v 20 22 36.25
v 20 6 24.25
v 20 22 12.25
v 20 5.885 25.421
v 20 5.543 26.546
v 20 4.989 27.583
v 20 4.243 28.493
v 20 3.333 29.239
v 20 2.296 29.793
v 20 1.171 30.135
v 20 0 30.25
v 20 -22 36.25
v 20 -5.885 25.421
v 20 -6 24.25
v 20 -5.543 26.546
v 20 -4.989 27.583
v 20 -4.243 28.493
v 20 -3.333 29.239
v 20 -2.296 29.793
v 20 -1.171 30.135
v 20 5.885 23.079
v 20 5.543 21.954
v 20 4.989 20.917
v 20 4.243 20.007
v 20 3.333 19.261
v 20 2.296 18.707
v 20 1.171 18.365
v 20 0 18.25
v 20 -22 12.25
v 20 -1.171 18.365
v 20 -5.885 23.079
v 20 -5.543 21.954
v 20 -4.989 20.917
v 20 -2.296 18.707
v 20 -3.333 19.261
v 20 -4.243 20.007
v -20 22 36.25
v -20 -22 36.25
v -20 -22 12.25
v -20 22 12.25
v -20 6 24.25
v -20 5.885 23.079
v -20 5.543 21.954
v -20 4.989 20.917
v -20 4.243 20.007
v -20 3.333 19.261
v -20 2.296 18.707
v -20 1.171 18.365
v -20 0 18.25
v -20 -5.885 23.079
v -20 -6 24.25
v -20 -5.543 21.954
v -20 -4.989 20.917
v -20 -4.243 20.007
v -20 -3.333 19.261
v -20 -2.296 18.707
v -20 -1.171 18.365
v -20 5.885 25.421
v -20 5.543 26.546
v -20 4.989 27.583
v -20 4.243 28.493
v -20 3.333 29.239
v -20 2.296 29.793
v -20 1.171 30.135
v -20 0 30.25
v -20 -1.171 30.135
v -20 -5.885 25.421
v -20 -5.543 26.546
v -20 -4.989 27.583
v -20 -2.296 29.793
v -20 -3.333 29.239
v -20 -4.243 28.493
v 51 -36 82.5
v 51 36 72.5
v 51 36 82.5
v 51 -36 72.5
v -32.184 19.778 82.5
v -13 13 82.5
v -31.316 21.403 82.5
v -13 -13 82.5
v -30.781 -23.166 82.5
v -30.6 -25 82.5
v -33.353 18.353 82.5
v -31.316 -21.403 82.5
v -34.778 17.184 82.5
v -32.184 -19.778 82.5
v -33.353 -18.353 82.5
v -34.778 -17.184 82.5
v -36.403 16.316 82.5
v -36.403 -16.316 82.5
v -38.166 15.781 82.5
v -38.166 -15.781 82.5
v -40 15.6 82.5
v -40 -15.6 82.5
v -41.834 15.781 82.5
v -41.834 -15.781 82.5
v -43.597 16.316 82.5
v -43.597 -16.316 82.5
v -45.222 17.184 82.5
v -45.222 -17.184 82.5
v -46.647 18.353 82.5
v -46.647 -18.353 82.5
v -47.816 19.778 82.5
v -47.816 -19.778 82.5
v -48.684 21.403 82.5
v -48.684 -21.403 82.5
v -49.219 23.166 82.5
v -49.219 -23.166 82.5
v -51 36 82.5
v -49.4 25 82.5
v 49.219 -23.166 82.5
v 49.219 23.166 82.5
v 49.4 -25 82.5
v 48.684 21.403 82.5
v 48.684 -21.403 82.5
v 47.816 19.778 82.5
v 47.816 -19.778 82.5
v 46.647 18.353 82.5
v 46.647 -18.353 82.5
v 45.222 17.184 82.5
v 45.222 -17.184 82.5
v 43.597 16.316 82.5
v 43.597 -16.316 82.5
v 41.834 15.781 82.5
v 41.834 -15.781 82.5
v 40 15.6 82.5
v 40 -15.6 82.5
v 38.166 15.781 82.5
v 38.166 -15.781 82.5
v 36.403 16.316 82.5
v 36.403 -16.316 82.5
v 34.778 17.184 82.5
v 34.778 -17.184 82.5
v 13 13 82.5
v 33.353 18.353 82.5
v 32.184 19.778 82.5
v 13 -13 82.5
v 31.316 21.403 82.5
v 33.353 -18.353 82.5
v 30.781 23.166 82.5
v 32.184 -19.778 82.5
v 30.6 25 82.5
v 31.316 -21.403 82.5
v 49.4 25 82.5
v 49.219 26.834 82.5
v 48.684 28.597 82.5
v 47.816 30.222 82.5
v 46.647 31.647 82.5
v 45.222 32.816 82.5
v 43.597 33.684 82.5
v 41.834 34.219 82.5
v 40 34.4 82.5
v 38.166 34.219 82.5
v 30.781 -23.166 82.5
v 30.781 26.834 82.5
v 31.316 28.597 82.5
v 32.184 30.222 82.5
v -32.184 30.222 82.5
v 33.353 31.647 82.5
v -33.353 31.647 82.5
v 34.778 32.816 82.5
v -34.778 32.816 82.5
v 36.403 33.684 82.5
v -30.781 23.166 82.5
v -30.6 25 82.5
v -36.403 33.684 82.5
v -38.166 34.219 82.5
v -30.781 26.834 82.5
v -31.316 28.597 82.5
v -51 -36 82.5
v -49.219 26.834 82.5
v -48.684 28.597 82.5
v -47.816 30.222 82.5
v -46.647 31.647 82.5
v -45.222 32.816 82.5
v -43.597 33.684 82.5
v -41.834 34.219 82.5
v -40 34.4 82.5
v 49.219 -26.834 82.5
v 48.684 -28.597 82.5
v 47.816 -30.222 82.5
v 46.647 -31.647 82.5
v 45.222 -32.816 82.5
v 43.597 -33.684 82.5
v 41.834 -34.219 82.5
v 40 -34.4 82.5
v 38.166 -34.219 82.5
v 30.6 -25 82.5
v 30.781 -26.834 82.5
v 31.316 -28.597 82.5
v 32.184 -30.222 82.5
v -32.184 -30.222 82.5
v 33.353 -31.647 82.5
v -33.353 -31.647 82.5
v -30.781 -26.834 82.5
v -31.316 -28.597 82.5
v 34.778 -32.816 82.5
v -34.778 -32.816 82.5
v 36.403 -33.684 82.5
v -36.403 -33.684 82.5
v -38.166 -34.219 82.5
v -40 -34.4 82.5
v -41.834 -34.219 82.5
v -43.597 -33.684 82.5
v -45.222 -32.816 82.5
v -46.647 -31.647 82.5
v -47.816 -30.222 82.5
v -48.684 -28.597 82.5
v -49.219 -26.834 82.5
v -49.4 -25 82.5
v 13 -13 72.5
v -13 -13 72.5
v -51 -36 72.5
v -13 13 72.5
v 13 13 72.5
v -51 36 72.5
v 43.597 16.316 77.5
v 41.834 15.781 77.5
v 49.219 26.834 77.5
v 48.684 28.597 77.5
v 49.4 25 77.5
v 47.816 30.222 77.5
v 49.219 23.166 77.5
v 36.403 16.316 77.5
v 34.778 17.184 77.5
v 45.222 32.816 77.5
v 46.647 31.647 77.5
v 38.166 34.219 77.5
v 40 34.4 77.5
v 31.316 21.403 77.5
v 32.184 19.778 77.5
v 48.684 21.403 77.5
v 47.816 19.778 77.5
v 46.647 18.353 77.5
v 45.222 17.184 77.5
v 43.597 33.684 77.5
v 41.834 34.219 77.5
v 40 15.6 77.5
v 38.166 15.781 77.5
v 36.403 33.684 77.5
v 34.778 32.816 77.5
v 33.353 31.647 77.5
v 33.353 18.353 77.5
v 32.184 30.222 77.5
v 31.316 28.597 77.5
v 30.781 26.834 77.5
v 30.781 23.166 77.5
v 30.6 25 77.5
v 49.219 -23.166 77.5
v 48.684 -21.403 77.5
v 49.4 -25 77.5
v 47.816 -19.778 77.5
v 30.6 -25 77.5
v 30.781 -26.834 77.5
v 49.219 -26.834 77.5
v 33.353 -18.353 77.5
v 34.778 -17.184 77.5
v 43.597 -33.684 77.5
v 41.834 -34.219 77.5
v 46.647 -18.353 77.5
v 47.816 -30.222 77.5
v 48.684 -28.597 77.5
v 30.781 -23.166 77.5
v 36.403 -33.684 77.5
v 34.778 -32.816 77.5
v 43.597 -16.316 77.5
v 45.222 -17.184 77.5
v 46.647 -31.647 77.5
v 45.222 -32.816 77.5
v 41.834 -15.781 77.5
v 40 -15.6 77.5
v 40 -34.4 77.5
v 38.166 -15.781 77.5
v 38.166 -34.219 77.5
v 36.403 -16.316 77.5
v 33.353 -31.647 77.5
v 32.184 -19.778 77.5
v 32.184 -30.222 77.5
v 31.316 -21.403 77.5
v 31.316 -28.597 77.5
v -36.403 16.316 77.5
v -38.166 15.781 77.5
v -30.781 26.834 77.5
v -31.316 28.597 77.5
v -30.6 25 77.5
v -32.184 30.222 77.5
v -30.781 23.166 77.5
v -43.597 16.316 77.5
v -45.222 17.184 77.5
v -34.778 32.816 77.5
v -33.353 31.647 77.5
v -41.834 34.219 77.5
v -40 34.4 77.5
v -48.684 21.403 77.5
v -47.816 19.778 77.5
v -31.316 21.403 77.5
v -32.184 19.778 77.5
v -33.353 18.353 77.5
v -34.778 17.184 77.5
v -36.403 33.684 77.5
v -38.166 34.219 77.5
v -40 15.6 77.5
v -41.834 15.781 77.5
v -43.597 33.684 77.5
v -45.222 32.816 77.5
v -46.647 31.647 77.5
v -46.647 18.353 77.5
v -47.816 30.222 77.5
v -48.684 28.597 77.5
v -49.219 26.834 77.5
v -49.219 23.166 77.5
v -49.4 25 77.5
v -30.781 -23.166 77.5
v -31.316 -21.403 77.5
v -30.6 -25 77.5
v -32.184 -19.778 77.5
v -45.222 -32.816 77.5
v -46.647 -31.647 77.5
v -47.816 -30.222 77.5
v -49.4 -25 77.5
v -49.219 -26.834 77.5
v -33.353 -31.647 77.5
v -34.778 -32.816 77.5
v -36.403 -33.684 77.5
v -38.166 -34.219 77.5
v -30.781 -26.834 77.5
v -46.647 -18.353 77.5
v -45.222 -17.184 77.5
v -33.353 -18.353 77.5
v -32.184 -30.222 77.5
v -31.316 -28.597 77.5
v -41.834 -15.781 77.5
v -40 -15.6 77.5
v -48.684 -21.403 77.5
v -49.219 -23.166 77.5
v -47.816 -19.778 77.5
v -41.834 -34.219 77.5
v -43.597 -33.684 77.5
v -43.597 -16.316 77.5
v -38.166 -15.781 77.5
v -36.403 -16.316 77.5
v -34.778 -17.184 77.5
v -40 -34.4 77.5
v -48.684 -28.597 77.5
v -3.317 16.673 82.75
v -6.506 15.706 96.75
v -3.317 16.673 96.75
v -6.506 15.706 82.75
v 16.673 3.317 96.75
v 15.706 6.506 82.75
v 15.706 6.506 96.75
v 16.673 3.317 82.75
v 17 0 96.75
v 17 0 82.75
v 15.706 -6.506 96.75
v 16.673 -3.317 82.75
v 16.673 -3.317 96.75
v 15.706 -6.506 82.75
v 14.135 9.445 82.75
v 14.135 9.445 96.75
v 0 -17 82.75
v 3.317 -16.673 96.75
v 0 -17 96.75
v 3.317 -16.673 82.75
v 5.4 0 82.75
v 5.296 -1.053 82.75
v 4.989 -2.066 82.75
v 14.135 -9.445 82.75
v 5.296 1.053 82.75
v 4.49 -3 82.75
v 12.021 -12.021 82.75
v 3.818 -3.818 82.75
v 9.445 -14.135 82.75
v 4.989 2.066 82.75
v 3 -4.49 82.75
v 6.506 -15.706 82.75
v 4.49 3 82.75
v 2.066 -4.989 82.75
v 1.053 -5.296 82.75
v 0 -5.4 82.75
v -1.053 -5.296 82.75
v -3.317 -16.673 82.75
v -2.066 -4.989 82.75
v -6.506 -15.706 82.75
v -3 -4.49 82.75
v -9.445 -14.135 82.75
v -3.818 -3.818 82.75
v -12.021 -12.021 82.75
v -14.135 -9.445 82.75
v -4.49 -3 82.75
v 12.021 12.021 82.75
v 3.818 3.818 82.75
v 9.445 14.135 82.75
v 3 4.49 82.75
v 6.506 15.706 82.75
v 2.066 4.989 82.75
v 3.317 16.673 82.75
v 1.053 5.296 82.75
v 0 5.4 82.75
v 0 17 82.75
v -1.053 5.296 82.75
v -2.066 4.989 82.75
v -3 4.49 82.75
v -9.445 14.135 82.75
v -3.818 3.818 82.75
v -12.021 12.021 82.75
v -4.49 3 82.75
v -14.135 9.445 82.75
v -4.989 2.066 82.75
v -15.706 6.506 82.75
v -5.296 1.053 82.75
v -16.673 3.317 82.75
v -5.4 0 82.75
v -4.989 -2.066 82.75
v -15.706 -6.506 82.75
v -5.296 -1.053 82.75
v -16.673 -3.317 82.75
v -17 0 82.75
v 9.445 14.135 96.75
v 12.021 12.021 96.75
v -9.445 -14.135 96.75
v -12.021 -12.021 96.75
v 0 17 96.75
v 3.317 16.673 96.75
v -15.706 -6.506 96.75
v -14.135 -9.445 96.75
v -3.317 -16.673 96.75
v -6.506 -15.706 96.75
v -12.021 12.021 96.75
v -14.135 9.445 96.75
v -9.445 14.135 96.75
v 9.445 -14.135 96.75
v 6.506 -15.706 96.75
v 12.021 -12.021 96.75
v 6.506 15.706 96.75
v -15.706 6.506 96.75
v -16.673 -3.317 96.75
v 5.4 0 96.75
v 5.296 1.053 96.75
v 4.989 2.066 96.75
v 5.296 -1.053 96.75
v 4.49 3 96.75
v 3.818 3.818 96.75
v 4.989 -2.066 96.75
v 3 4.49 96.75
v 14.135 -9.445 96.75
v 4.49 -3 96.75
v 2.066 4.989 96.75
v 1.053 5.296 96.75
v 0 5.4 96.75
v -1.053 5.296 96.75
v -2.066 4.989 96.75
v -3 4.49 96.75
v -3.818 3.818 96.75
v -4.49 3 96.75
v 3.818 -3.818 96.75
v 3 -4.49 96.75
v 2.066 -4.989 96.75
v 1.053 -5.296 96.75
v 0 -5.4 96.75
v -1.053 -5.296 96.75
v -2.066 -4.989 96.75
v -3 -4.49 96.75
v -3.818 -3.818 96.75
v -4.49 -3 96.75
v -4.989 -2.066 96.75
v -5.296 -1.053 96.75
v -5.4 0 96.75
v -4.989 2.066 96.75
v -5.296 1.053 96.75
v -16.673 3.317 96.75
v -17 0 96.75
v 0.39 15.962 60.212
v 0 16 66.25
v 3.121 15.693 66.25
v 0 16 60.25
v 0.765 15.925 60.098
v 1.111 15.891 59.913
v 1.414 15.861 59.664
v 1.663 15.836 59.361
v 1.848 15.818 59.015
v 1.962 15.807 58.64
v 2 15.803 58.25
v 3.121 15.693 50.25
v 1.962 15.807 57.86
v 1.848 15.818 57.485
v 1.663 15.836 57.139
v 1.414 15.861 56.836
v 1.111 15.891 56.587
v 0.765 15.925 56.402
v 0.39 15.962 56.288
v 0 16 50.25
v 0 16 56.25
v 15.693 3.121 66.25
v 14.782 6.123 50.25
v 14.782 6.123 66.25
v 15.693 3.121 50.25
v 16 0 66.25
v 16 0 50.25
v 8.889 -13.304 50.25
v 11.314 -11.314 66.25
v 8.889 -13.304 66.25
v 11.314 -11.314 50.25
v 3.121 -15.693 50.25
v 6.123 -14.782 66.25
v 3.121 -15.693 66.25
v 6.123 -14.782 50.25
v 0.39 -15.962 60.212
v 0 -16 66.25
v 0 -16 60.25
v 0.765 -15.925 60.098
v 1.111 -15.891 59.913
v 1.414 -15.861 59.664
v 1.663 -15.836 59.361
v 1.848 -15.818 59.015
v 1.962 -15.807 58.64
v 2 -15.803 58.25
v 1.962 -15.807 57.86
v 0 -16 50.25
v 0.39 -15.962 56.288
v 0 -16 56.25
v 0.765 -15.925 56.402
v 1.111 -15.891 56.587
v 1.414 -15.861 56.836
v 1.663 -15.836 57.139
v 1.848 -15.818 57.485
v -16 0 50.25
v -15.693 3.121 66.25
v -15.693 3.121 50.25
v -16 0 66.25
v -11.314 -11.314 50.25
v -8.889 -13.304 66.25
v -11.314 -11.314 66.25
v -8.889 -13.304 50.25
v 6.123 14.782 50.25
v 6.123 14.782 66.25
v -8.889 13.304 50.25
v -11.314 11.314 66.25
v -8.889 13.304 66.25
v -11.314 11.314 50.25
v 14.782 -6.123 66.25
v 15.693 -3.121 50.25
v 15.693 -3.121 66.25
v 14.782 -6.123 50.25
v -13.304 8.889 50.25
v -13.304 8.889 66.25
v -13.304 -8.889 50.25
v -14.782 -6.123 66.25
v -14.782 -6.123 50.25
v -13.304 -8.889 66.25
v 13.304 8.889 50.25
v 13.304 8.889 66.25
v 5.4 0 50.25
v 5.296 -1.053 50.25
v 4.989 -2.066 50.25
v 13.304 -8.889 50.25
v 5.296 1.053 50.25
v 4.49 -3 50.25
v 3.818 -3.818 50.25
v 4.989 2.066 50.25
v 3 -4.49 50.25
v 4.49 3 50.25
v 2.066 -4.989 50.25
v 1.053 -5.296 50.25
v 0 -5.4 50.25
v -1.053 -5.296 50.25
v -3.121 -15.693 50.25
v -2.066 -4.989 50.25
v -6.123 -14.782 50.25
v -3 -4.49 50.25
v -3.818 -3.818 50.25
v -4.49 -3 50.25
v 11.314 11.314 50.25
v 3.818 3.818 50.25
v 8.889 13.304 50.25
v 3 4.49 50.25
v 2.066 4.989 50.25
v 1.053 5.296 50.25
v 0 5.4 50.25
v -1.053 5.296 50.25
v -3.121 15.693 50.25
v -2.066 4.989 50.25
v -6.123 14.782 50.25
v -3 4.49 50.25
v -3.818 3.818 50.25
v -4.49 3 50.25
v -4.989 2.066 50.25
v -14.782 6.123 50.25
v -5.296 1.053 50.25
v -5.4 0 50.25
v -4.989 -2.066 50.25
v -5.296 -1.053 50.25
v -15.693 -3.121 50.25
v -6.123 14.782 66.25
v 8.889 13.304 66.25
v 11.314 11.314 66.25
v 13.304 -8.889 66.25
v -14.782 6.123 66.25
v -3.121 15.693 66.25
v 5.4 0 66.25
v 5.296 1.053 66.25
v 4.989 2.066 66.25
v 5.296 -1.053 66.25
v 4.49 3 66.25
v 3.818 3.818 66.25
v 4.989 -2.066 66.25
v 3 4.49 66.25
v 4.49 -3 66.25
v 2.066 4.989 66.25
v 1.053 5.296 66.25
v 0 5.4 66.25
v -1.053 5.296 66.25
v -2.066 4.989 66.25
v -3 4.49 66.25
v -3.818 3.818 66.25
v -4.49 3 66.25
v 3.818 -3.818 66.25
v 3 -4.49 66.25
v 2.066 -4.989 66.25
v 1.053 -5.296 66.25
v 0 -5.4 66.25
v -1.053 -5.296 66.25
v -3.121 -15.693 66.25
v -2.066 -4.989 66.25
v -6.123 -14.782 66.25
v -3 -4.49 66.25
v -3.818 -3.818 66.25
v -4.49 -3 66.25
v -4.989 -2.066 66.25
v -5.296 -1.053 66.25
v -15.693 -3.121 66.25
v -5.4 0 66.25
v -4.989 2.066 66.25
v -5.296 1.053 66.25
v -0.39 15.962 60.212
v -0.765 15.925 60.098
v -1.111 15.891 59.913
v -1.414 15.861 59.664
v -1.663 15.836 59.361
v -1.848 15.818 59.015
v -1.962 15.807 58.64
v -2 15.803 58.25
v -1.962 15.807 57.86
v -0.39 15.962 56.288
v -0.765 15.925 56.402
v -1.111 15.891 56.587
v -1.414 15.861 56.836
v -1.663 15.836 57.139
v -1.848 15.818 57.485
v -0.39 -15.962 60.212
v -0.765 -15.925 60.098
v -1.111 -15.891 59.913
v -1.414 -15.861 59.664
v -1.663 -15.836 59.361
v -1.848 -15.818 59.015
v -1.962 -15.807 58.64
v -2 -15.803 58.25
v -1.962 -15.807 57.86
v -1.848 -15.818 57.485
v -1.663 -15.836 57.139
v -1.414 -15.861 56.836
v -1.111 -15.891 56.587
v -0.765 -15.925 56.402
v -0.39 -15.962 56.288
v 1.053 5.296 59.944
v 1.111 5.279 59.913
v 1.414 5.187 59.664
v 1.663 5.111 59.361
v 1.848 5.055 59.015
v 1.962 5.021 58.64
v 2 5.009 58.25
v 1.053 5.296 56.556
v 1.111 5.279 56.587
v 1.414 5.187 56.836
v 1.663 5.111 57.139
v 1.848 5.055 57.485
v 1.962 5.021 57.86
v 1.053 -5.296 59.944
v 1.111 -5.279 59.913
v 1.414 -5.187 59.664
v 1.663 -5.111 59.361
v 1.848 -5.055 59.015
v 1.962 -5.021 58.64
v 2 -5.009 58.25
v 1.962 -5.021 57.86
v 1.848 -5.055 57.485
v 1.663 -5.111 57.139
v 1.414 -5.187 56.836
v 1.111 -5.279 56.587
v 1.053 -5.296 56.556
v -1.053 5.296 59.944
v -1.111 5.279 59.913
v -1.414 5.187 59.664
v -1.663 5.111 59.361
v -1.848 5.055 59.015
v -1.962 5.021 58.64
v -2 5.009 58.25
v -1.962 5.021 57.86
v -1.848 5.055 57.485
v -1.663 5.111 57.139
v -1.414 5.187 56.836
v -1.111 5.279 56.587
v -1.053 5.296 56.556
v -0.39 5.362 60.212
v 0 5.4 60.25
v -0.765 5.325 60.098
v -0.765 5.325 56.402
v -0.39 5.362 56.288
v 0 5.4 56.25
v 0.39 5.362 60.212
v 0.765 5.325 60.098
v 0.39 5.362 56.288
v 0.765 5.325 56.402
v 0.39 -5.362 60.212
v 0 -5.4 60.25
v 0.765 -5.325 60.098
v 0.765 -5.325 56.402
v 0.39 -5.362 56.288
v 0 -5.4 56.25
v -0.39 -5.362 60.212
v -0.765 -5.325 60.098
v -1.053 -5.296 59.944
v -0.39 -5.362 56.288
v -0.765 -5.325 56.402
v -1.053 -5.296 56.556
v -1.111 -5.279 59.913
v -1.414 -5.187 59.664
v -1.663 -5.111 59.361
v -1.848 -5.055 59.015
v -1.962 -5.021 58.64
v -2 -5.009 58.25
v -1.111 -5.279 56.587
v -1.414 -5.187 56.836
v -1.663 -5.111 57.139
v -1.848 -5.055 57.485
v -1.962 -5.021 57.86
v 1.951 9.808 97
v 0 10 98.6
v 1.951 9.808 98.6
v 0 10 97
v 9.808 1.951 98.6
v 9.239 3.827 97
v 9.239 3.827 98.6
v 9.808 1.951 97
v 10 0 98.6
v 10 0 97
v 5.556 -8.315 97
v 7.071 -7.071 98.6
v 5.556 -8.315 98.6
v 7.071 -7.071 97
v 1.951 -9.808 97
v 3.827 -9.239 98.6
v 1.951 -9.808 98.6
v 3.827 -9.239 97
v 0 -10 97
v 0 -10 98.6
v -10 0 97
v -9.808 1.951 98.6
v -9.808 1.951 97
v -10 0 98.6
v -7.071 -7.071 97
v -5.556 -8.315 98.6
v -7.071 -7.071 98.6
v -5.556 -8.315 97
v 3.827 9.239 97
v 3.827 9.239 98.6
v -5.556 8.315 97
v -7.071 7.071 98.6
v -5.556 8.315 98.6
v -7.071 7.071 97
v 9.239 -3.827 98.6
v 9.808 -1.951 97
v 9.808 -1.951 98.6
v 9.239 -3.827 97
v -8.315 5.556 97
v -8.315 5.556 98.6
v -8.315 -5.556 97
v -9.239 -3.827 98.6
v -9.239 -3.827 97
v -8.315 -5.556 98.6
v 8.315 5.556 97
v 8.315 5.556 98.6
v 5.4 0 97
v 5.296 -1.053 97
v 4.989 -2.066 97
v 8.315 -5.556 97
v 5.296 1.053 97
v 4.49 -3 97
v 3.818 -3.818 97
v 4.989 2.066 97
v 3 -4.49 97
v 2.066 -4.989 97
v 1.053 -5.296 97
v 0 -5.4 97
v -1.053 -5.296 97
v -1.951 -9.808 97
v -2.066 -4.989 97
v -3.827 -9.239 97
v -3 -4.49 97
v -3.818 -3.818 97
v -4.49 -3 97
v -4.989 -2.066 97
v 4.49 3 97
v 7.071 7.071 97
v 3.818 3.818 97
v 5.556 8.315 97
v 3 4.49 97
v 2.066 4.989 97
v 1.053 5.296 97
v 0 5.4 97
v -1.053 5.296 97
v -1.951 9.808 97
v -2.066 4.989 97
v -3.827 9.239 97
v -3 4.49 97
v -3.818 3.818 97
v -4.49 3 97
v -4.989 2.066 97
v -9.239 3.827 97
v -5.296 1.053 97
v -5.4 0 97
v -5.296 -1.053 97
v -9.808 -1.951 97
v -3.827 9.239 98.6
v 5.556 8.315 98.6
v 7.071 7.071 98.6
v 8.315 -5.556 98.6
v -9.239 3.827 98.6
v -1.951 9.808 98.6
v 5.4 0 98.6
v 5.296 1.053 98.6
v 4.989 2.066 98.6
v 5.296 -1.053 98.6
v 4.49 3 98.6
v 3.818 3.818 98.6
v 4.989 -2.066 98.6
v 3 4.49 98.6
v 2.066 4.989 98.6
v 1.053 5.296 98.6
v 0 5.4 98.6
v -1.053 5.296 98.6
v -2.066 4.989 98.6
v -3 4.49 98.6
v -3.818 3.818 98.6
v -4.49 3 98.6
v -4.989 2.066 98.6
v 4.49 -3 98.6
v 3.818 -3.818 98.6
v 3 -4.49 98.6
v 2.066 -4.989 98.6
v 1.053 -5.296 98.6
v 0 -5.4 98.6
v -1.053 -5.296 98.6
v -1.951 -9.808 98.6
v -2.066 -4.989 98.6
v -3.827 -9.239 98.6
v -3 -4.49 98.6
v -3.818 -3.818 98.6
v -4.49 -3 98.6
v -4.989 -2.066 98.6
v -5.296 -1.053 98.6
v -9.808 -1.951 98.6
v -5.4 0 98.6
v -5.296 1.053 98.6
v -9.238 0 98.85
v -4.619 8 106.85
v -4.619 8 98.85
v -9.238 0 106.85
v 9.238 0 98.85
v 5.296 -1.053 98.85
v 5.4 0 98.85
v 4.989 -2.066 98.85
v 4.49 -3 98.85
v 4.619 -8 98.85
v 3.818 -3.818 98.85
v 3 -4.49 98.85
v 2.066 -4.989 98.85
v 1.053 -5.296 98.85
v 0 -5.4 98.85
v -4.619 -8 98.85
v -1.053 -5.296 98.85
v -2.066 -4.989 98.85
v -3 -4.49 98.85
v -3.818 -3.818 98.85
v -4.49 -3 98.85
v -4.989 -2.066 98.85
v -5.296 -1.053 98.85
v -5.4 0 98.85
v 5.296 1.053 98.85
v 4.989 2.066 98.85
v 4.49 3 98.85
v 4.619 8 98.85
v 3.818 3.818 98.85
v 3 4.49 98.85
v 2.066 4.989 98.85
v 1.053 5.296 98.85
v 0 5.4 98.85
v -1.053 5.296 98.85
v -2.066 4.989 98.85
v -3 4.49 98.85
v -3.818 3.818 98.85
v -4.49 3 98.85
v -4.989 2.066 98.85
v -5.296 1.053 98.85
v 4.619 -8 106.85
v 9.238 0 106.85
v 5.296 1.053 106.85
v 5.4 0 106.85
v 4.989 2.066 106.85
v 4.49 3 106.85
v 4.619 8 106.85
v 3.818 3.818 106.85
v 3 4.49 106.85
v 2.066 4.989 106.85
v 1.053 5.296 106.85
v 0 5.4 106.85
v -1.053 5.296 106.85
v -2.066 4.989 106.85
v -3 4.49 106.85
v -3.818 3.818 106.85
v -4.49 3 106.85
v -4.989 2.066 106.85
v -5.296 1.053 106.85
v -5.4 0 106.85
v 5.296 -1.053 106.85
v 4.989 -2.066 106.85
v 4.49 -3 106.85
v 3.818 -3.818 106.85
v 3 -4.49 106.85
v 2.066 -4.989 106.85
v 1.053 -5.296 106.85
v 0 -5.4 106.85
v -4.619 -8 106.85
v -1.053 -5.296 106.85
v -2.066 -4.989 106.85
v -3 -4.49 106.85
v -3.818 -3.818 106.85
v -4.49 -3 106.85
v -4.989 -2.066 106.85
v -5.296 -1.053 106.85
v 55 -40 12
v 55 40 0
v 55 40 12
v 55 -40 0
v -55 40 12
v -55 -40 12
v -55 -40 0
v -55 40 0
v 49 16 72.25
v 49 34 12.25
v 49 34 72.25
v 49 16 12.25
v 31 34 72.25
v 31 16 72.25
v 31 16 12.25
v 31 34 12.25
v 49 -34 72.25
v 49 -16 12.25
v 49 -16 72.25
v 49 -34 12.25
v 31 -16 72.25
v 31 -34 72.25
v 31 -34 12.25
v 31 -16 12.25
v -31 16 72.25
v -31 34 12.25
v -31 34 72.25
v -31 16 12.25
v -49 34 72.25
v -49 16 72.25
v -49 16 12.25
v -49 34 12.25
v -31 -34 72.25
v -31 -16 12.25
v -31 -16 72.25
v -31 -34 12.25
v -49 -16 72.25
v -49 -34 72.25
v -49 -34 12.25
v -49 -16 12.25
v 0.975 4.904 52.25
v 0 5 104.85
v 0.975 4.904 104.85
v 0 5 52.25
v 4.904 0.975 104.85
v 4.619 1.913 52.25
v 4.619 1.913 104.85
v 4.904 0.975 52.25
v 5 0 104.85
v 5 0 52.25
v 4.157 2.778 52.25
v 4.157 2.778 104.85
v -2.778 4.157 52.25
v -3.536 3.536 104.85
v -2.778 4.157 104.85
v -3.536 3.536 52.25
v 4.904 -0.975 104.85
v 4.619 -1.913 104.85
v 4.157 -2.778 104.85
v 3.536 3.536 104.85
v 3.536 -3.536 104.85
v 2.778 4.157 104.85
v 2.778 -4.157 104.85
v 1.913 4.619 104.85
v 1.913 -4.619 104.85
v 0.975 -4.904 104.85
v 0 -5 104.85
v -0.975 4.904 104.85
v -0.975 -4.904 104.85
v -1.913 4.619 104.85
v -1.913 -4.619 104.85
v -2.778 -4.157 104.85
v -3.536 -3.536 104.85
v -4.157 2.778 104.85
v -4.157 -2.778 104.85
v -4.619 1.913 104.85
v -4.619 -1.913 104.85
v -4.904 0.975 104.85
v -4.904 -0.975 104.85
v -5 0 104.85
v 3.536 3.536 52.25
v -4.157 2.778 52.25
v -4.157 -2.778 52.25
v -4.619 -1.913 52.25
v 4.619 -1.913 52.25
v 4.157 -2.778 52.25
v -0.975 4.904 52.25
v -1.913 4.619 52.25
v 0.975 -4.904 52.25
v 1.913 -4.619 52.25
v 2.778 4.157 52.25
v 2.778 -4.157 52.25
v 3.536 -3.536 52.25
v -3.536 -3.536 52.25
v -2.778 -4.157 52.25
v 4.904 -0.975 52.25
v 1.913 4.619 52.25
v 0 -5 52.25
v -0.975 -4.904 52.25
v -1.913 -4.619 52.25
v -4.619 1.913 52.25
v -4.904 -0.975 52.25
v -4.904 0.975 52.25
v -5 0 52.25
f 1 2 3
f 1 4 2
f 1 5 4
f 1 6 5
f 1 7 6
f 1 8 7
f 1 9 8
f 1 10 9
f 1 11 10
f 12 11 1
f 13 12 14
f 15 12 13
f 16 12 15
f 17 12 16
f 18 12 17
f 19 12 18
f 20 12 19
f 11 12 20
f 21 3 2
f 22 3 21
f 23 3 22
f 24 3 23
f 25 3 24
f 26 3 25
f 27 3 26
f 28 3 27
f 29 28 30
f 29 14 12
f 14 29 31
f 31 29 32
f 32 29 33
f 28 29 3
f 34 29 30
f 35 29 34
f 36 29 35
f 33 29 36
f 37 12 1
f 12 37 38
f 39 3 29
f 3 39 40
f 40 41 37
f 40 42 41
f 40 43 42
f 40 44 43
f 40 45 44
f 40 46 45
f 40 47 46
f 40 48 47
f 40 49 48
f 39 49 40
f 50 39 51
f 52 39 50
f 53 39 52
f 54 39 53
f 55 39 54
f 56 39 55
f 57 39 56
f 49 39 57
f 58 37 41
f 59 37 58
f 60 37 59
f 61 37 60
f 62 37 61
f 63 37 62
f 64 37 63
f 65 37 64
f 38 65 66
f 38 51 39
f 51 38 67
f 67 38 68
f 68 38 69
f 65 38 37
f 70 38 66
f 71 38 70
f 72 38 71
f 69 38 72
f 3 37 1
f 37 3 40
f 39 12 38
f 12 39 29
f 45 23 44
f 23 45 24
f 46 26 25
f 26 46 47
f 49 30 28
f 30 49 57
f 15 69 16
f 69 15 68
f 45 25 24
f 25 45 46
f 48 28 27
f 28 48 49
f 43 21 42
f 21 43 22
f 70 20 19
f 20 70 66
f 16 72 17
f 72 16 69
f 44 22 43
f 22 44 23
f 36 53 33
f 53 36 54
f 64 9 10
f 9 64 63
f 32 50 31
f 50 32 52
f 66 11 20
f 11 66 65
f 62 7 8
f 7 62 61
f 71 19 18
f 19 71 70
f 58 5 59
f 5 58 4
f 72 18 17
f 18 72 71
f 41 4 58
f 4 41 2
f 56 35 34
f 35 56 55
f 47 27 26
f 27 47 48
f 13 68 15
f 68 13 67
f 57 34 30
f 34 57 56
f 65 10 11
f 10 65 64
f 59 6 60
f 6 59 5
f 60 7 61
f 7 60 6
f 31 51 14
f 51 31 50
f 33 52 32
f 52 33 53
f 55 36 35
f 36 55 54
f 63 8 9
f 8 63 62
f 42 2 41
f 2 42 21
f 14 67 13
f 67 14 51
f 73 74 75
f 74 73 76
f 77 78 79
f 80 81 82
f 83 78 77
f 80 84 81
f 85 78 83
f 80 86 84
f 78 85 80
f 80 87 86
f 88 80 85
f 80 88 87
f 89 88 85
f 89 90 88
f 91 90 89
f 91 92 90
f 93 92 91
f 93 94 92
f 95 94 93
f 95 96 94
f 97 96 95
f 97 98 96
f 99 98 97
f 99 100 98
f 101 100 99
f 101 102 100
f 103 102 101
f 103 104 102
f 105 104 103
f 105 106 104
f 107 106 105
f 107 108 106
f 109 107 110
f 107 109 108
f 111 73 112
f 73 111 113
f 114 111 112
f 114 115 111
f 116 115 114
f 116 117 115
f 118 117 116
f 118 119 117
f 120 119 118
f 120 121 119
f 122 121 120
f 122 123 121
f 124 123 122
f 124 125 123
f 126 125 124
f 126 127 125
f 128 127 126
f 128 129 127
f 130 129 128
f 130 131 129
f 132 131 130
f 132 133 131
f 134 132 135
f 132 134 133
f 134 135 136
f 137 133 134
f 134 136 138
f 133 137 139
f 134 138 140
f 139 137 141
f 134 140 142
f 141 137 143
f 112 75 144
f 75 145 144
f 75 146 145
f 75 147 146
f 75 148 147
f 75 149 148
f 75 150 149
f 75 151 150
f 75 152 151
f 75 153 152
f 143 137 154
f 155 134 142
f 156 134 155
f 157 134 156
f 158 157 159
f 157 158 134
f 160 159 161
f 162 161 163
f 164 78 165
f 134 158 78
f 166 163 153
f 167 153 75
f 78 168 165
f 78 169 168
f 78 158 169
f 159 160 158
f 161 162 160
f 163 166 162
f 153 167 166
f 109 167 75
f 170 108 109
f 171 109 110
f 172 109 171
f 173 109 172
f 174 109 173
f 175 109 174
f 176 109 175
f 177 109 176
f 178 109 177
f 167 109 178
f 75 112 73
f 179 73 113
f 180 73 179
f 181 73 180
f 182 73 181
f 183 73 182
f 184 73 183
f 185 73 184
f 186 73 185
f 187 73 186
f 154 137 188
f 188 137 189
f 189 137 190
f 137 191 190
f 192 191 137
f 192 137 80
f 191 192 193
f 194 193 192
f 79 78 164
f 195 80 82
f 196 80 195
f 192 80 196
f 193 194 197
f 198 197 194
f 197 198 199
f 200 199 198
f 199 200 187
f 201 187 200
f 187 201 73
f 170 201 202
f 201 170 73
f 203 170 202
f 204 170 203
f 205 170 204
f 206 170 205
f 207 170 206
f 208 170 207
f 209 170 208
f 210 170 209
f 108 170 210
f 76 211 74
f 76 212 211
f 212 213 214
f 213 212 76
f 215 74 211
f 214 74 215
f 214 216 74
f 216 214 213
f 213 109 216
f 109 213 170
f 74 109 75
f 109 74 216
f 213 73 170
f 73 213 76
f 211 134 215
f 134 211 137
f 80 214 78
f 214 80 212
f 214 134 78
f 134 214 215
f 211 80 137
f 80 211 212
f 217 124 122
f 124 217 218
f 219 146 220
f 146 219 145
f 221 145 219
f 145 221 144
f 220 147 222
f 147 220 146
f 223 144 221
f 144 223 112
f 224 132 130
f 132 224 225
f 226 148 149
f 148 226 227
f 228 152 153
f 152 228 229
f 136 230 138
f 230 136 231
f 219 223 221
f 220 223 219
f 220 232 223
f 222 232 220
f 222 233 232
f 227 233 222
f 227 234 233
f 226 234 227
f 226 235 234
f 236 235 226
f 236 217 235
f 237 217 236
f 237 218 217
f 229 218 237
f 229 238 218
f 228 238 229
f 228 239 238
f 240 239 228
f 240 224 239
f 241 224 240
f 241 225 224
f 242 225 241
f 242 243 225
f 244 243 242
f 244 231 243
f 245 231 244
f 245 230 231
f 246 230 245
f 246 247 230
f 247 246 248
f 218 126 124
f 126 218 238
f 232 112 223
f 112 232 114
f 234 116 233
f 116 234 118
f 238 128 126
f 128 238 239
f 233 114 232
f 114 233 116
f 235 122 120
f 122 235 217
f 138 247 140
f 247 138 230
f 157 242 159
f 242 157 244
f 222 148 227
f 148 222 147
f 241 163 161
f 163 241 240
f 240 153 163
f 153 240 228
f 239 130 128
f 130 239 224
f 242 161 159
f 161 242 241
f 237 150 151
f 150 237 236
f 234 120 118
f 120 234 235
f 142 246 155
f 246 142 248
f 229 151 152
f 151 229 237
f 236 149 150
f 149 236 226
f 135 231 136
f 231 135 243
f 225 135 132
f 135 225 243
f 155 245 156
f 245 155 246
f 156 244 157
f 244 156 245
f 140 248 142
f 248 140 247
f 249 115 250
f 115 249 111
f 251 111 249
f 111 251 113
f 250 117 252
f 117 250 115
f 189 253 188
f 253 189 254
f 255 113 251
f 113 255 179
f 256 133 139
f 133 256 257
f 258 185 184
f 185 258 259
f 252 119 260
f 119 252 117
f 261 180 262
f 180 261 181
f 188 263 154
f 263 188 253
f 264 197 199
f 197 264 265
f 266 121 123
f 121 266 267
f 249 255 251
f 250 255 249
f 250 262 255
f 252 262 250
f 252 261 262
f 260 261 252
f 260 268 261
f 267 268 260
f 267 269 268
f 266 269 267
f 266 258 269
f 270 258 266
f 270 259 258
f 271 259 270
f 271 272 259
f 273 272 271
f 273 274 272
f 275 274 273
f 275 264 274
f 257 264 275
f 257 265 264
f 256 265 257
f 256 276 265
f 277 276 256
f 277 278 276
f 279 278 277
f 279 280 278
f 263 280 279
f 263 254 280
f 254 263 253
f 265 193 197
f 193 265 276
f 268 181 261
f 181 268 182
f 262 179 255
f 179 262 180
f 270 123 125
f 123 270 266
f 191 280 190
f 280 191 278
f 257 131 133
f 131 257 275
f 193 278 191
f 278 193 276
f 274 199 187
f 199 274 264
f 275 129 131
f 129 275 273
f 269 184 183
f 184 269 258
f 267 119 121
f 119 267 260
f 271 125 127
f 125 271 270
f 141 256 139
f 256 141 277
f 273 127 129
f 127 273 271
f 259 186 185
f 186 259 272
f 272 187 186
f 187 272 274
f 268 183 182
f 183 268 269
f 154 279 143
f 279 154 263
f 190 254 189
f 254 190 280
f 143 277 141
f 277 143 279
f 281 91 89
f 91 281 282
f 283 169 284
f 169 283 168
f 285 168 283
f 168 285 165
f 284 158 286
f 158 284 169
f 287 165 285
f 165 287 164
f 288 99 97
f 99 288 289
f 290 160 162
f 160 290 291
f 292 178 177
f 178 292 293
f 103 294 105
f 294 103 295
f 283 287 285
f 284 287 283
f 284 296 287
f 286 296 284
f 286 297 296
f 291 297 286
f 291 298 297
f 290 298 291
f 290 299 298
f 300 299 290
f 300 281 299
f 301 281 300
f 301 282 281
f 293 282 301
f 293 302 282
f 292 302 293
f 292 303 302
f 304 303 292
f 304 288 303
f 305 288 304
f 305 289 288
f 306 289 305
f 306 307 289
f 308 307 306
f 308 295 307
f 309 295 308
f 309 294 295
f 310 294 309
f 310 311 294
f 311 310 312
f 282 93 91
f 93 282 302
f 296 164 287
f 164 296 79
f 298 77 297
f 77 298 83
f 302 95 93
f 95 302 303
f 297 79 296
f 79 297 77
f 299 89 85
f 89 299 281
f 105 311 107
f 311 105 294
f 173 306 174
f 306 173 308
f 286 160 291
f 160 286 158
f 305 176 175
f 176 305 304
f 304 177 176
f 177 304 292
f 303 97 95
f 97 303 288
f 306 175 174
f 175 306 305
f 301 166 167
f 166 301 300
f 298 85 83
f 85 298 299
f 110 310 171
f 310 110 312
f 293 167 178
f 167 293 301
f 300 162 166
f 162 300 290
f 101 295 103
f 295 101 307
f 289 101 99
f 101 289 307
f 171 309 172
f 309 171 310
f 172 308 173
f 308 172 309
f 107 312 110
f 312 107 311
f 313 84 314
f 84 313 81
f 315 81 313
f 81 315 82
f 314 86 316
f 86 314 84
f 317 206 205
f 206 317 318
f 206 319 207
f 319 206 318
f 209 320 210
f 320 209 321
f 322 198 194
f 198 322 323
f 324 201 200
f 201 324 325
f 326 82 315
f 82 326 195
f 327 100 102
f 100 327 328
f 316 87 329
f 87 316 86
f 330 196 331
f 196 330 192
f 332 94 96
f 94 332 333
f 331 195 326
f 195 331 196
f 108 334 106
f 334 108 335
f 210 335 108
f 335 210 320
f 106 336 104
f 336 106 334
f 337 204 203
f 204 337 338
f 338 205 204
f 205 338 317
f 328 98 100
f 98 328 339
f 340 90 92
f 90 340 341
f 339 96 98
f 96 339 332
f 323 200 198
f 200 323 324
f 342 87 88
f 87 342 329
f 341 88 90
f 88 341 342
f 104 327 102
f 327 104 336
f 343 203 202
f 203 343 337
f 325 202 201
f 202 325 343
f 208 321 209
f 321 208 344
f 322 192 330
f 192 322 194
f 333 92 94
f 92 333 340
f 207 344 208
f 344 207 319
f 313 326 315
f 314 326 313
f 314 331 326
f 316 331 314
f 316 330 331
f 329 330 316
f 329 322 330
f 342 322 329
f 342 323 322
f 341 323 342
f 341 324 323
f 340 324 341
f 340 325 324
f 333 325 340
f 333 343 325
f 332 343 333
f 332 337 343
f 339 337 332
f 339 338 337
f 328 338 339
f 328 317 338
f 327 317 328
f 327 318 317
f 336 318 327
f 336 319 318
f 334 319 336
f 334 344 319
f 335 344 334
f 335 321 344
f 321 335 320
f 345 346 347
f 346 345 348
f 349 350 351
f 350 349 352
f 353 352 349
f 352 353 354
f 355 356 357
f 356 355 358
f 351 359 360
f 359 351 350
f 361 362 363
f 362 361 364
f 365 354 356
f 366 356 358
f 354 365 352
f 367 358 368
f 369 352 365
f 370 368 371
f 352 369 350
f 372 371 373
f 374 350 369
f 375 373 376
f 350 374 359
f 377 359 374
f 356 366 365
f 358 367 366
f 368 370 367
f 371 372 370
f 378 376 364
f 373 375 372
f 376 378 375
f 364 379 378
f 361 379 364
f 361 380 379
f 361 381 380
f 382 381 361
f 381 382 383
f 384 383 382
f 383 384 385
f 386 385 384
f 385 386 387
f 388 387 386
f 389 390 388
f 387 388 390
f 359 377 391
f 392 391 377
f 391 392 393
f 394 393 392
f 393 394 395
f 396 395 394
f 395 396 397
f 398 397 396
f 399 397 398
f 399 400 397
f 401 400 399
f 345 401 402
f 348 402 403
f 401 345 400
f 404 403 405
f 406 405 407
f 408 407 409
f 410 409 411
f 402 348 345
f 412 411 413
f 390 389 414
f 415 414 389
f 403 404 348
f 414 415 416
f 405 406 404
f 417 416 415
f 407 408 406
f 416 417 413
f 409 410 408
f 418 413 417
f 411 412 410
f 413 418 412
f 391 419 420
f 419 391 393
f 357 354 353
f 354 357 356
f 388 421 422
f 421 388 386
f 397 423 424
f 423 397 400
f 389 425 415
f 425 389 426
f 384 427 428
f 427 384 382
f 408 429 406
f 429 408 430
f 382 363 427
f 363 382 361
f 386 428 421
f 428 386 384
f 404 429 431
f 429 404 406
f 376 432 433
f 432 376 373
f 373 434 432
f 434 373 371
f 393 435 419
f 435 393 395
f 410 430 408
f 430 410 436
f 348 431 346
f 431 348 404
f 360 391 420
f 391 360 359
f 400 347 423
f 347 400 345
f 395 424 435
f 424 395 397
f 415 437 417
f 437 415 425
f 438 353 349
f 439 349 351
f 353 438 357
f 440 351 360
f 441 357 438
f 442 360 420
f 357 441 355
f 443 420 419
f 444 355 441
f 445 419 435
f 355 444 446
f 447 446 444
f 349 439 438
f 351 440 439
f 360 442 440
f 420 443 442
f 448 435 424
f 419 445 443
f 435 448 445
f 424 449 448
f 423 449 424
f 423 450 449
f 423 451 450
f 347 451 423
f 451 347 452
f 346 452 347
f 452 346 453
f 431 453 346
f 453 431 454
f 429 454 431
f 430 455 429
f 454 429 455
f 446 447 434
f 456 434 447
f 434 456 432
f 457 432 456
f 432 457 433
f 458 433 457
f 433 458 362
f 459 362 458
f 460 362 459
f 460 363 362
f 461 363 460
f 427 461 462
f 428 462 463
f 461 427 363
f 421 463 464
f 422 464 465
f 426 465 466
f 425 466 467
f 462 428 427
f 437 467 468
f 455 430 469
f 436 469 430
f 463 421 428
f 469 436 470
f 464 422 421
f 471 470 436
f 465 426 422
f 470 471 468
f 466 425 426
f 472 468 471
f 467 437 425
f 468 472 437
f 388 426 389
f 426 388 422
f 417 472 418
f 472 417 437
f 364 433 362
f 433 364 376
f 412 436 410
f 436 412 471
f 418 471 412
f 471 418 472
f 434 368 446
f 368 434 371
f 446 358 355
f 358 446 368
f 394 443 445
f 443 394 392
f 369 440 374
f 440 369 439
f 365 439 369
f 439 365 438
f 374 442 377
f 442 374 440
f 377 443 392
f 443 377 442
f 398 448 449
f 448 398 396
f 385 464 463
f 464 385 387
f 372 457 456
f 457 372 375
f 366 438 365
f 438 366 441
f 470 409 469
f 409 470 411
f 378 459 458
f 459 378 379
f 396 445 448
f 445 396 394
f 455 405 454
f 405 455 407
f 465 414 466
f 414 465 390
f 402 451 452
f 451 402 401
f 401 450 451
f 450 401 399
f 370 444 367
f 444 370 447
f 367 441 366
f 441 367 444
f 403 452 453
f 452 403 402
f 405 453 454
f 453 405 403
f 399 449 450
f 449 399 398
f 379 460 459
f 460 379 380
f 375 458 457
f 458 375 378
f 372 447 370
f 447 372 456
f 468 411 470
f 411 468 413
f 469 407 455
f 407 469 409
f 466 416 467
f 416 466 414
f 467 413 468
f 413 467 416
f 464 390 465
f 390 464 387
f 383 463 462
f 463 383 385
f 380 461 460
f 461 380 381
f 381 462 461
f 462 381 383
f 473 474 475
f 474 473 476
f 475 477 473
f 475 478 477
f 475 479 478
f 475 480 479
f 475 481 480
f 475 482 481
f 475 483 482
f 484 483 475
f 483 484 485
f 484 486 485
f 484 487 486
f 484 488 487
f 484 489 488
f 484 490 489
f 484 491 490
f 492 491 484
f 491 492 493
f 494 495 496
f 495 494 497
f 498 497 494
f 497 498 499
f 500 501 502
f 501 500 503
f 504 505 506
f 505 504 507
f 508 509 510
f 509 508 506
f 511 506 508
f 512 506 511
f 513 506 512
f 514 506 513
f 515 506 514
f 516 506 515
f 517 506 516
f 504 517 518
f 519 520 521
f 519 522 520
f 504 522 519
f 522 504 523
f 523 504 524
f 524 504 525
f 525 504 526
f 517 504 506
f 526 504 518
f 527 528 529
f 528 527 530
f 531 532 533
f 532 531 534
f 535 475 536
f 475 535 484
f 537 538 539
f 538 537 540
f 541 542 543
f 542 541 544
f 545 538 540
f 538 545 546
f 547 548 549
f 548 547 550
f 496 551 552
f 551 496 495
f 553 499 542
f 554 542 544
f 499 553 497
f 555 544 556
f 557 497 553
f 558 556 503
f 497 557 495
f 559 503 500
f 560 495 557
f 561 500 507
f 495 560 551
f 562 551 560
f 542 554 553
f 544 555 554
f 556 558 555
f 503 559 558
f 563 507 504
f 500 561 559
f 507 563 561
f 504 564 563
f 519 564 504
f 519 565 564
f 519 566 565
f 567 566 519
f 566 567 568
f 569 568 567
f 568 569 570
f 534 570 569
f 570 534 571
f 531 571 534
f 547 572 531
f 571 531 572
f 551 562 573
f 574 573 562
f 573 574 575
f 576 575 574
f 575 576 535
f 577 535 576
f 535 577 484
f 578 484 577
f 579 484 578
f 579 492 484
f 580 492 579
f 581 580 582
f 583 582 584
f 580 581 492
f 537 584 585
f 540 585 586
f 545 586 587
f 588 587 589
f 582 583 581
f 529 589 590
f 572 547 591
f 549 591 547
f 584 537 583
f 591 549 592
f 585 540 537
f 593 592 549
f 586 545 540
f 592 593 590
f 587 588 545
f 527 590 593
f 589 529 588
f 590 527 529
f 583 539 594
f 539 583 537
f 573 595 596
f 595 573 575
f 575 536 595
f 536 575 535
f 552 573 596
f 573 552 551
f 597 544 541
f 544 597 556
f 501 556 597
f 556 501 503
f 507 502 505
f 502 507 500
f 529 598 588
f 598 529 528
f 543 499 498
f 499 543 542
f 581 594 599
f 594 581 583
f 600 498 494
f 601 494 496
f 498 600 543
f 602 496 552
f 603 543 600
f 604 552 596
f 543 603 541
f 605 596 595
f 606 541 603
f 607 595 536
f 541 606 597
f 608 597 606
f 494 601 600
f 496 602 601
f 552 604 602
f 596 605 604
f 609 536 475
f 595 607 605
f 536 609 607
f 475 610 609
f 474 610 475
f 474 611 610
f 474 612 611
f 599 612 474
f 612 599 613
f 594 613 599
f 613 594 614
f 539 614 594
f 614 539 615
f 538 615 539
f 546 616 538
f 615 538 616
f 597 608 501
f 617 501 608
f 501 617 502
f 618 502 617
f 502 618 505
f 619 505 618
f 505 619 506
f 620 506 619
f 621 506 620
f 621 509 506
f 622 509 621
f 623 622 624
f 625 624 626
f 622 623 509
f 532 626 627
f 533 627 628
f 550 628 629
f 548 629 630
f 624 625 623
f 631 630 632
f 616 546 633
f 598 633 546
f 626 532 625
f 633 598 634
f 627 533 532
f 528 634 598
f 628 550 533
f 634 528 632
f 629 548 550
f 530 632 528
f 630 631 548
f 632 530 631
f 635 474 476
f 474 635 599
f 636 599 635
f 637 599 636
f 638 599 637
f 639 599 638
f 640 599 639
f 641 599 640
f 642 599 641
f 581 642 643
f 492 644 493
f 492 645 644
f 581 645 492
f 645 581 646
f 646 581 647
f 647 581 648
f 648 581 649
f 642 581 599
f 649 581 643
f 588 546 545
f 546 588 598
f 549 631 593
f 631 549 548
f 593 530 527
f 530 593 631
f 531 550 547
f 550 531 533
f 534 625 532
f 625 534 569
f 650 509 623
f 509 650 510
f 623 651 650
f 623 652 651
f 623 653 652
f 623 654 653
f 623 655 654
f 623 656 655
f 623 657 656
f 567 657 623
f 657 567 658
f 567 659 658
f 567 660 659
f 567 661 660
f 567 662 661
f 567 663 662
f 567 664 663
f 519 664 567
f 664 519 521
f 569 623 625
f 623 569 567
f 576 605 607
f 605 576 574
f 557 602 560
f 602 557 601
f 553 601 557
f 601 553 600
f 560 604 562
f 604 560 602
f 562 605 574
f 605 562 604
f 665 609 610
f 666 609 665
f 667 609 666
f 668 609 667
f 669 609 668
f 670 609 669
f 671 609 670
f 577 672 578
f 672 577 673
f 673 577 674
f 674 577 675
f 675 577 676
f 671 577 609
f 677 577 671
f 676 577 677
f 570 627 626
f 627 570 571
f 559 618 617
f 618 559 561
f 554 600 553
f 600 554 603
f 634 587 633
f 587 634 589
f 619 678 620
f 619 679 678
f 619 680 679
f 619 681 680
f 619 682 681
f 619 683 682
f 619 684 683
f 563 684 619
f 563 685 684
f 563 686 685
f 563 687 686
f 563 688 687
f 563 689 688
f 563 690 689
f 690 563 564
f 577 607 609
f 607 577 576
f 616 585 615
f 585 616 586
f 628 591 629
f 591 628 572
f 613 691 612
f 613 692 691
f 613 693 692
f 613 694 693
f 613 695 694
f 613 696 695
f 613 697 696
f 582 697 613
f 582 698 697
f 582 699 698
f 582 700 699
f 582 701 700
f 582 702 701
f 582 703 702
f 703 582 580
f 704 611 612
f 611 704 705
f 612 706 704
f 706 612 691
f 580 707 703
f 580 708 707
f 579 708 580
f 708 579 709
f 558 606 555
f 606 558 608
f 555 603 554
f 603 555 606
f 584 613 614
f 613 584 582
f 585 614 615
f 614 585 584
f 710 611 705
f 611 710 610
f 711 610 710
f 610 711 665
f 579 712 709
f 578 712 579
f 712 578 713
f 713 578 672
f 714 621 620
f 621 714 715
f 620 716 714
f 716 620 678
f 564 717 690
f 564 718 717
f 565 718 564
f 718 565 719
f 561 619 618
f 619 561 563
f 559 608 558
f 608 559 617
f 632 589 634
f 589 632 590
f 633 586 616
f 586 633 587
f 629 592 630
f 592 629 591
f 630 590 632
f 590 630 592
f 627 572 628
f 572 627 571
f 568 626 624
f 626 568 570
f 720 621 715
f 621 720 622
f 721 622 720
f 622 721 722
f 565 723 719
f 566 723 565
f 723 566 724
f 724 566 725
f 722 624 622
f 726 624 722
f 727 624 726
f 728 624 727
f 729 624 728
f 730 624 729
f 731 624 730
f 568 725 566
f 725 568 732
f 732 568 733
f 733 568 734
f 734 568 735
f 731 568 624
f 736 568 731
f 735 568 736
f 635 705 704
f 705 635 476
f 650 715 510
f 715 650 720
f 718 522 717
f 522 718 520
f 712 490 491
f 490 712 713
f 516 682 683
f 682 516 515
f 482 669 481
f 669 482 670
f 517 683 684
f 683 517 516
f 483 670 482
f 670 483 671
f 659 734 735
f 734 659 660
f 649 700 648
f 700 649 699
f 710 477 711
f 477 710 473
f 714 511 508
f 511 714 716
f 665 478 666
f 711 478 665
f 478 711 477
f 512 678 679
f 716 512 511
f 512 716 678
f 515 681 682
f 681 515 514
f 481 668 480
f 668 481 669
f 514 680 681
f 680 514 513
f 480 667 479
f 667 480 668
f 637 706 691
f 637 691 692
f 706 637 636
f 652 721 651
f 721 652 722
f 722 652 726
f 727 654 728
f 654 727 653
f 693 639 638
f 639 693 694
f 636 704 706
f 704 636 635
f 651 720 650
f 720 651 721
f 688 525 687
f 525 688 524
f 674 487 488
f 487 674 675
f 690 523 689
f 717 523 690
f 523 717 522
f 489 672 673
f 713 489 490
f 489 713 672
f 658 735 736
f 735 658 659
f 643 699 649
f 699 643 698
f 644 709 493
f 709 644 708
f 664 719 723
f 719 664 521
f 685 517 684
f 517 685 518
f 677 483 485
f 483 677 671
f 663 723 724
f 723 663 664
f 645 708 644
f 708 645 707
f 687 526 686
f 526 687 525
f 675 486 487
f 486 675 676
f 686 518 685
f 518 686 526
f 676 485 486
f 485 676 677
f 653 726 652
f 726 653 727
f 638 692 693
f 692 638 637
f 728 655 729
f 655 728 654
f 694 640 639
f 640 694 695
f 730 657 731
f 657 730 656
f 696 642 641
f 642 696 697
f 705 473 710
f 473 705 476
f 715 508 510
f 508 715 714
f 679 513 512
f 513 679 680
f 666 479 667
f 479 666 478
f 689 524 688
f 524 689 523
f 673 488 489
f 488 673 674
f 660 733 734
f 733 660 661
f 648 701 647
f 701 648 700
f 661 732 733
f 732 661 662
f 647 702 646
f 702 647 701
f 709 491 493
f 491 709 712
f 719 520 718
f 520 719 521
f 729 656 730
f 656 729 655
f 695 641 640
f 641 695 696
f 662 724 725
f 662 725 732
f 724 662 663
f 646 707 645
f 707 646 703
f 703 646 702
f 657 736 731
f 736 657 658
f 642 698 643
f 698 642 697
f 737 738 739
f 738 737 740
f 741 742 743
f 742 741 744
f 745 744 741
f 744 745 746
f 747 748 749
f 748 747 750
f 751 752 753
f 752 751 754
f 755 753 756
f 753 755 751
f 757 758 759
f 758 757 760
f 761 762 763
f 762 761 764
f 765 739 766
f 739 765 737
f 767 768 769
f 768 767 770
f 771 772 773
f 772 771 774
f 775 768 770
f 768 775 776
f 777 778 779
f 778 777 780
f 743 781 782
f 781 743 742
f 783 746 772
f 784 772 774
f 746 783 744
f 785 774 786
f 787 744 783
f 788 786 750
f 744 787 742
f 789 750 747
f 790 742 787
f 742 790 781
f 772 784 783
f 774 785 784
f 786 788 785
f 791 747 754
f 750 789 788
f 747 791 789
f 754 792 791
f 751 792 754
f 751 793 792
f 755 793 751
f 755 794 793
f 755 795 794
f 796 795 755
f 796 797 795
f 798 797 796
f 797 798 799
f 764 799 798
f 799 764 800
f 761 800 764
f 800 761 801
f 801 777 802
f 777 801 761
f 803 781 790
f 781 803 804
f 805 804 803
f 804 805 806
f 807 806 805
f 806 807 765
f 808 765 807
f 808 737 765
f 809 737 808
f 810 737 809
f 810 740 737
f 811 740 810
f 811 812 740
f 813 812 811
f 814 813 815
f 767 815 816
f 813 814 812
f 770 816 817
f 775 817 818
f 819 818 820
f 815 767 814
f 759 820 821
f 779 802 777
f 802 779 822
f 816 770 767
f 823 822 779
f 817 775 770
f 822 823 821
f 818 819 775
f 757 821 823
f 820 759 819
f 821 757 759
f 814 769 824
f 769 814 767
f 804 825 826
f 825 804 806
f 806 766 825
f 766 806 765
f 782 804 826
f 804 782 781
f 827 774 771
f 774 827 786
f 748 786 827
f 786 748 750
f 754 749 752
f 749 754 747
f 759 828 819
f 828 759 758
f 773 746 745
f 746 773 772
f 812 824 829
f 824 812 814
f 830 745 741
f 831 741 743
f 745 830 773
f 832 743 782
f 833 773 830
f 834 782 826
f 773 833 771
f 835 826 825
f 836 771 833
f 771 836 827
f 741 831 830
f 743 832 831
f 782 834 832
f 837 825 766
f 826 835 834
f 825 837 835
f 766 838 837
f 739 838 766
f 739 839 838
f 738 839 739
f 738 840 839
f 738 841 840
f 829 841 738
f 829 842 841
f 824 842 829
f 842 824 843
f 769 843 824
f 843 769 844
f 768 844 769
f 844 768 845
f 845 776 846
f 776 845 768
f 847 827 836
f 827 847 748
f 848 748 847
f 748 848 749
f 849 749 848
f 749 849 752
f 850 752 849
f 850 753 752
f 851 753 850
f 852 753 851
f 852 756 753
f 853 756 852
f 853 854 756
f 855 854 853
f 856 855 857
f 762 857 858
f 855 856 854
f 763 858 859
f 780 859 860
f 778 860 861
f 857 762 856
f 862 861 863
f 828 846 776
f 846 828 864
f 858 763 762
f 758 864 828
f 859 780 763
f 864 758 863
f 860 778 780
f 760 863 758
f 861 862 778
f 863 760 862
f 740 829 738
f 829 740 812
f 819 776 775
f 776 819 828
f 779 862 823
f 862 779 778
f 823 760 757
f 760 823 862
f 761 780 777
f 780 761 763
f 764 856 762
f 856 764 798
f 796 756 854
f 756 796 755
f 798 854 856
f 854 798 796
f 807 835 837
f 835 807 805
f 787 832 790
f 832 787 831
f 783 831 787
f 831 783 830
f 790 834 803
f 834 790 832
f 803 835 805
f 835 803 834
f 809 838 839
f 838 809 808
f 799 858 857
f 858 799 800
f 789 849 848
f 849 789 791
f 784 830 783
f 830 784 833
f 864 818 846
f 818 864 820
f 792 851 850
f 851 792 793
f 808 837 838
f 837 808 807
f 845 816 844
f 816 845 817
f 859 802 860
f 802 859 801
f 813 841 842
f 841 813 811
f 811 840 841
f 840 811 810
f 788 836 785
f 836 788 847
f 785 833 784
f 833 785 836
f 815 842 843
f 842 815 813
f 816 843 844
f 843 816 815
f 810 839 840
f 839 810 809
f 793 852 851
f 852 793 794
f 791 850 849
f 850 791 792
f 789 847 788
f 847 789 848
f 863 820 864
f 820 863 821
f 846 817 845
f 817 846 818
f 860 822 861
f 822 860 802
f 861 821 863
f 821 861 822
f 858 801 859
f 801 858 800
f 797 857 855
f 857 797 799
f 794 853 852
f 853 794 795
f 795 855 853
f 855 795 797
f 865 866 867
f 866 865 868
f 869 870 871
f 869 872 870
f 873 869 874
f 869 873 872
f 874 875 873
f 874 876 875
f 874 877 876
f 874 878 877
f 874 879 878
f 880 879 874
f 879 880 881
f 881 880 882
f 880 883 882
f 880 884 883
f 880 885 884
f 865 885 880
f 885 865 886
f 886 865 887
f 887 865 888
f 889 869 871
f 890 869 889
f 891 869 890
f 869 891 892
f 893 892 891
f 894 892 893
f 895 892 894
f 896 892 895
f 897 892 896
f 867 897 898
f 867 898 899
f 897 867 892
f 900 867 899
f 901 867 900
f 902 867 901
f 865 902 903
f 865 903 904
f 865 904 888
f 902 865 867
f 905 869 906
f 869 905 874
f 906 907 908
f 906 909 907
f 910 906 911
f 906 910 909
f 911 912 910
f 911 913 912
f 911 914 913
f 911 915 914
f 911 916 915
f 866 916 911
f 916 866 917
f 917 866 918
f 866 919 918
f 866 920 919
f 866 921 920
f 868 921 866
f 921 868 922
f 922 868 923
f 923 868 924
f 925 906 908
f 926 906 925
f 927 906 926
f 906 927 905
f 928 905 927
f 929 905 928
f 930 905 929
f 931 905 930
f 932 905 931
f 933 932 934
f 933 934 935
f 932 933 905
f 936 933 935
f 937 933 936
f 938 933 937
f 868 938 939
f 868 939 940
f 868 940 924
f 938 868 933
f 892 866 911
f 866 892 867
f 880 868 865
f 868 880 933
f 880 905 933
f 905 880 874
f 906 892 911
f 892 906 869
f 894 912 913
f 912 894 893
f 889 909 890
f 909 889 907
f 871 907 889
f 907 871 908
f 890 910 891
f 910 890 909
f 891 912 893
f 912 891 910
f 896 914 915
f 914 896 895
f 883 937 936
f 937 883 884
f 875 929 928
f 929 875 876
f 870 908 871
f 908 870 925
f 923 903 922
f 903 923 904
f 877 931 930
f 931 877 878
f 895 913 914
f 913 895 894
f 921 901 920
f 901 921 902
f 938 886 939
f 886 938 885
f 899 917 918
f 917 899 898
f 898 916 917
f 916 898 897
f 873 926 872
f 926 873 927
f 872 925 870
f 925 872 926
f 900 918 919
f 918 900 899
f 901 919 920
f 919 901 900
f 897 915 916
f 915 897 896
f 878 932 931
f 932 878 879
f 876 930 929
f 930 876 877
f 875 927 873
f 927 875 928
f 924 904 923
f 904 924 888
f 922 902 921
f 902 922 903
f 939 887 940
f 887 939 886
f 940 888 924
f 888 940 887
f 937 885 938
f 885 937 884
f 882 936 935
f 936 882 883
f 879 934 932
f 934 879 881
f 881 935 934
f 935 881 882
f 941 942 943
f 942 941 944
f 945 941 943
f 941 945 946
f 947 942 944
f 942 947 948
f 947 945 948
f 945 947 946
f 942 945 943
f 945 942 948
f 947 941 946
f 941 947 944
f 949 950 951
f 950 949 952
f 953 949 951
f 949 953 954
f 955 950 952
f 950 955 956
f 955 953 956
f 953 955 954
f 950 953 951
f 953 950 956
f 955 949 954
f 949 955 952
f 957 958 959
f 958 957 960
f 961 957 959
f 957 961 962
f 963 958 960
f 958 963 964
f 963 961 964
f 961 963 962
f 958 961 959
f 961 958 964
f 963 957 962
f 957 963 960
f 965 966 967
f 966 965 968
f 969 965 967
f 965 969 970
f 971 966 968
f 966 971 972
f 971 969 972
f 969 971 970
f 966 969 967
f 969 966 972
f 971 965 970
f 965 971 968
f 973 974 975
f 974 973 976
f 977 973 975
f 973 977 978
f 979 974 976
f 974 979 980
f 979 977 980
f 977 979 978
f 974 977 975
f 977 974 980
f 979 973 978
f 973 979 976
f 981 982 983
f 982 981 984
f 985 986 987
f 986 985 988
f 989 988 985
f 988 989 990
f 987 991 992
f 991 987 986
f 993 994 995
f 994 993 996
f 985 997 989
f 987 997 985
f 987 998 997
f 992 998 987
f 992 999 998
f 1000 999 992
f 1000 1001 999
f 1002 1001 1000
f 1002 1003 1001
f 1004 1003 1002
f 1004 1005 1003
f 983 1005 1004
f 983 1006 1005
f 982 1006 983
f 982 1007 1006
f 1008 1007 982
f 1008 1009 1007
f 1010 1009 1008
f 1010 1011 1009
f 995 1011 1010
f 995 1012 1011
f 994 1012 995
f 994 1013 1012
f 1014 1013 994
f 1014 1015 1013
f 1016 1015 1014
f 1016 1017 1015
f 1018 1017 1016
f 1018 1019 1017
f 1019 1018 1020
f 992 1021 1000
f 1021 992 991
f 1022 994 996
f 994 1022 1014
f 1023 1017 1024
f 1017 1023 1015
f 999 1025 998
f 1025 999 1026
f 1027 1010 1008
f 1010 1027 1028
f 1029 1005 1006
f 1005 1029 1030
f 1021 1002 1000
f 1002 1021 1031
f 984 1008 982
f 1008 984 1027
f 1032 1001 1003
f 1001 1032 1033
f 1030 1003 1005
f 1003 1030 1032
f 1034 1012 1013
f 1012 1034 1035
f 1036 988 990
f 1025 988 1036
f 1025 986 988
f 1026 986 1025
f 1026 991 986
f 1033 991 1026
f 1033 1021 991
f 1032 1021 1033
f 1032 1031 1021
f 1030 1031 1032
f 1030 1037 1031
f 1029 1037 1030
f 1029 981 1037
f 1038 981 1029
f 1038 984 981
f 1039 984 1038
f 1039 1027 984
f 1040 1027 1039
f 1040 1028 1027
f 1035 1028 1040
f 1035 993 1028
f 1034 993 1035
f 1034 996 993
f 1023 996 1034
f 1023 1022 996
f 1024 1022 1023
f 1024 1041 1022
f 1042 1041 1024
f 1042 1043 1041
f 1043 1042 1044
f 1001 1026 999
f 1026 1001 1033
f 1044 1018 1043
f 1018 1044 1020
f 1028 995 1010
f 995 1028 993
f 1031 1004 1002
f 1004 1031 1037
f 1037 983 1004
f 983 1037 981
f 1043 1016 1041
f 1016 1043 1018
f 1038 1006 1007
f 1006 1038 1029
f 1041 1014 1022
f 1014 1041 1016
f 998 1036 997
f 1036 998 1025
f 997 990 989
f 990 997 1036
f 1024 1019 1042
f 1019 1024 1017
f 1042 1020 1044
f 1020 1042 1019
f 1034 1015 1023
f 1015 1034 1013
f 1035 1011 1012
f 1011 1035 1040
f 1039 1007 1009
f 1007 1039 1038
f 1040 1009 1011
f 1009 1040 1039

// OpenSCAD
$fn = 32;

// ------------------------------------------------------------------------
// Arbor press fixture: screw d10, posts 60 mm, gap 14 mm
// Every part is its own module, assembly() places every instance.
// ------------------------------------------------------------------------

// --- part 1 ---
module press_bed() {
  difference() {
    translate([-55, -40, 0]) cube([110, 80, 12]);
  }
}

// --- part 2 ---
module anvil_block() {
  difference() {
    translate([-20, -22, 0]) cube([40, 44, 24]);
    translate([0, 0, 12]) rotate([0, 90, 0]) cylinder(h = 42, d = 12, center = true);
  }
}

// --- part 3 ---
module press_post_a() {
  translate([-9, -9, 0]) cube([18, 18, 60]);
}

// --- part 4 ---
module press_post_b() {
  translate([-9, -9, 0]) cube([18, 18, 60]);
}

// --- part 5 ---
module press_post_c() {
  translate([-9, -9, 0]) cube([18, 18, 60]);
}

// --- part 6 ---
module press_post_d() {
  translate([-9, -9, 0]) cube([18, 18, 60]);
}

// --- part 7 ---
module press_frame() {
  difference() {
    translate([-51, -36, 0]) cube([102, 72, 10]);
    translate([-13, -13, -1]) cube([26, 26, 12]);
    translate([40, 25, 5]) cylinder(h = 6, d = 18.8);
    translate([40, -25, 5]) cylinder(h = 6, d = 18.8);
    translate([-40, 25, 5]) cylinder(h = 6, d = 18.8);
    translate([-40, -25, 5]) cylinder(h = 6, d = 18.8);
  }
}

// --- part 8 ---
module guide_ring() {
  difference() {
      translate([0, 0, 0]) cylinder(h = 14, d = 34);
      translate([0, 0, -1]) cylinder(h = 16, d = 10.8);
    }
}

// --- part 9 ---
module press_screw() {
  translate([0, 0, -26.3]) cylinder(h = 52.6, d = 10);
}

// --- part 10 ---
module press_head() {
  difference() {
    cylinder(h = 16, d = 32);
    translate([0, 0, -1]) cylinder(h = 18, d = 10.8);
    translate([0, 0, 8]) rotate([90, 0, 0]) cylinder(h = 34, d = 4, center = true);
  }
}

// --- part 11 ---
module nut_washer() {
  difference() {
      translate([0, 0, 0]) cylinder(h = 1.6, d = 20);
      translate([0, 0, -1]) cylinder(h = 3.6, d = 10.8);
    }
}

// --- part 12 ---
module press_nut() {
  difference() {
    linear_extrude(height = 8) polygon(points = [[9.238, 0], [4.619, 8], [-4.619, 8], [-9.238, 0], [-4.619, -8], [4.619, -8]]);
    translate([0, 0, -1]) cylinder(h = 10, d = 10.8);
  }
}

// --- assembly ---
module assembly() {
  color([0.80, 0.24, 0.20]) translate([0, 0, 0]) rotate([0, 0, 0]) press_bed();
  color([0.20, 0.45, 0.75]) translate([0, 0, 12.25]) rotate([0, 0, 0]) anvil_block();
  color([0.25, 0.62, 0.32]) translate([40, 25, 12.25]) rotate([0, 0, 0]) press_post_a();
  color([0.92, 0.70, 0.18]) translate([40, -25, 12.25]) rotate([0, 0, 0]) press_post_b();
  color([0.58, 0.35, 0.70]) translate([-40, 25, 12.25]) rotate([0, 0, 0]) press_post_c();
  color([0.16, 0.66, 0.66]) translate([-40, -25, 12.25]) rotate([0, 0, 0]) press_post_d();
  color([0.85, 0.48, 0.18]) translate([0, 0, 72.5]) rotate([0, 0, 0]) press_frame();
  color([0.55, 0.60, 0.65]) translate([0, 0, 82.75]) rotate([0, 0, 0]) guide_ring();
  color([0.75, 0.30, 0.55]) translate([0, 0, 78.55]) rotate([0, 0, 0]) press_screw();
  color([0.42, 0.52, 0.28]) translate([0, 0, 50.25]) rotate([0, 0, 0]) press_head();
  color([0.80, 0.24, 0.20]) translate([0, 0, 97]) rotate([0, 0, 0]) nut_washer();
  color([0.20, 0.45, 0.75]) translate([0, 0, 98.85]) rotate([0, 0, 0]) press_nut();
}

assembly();
